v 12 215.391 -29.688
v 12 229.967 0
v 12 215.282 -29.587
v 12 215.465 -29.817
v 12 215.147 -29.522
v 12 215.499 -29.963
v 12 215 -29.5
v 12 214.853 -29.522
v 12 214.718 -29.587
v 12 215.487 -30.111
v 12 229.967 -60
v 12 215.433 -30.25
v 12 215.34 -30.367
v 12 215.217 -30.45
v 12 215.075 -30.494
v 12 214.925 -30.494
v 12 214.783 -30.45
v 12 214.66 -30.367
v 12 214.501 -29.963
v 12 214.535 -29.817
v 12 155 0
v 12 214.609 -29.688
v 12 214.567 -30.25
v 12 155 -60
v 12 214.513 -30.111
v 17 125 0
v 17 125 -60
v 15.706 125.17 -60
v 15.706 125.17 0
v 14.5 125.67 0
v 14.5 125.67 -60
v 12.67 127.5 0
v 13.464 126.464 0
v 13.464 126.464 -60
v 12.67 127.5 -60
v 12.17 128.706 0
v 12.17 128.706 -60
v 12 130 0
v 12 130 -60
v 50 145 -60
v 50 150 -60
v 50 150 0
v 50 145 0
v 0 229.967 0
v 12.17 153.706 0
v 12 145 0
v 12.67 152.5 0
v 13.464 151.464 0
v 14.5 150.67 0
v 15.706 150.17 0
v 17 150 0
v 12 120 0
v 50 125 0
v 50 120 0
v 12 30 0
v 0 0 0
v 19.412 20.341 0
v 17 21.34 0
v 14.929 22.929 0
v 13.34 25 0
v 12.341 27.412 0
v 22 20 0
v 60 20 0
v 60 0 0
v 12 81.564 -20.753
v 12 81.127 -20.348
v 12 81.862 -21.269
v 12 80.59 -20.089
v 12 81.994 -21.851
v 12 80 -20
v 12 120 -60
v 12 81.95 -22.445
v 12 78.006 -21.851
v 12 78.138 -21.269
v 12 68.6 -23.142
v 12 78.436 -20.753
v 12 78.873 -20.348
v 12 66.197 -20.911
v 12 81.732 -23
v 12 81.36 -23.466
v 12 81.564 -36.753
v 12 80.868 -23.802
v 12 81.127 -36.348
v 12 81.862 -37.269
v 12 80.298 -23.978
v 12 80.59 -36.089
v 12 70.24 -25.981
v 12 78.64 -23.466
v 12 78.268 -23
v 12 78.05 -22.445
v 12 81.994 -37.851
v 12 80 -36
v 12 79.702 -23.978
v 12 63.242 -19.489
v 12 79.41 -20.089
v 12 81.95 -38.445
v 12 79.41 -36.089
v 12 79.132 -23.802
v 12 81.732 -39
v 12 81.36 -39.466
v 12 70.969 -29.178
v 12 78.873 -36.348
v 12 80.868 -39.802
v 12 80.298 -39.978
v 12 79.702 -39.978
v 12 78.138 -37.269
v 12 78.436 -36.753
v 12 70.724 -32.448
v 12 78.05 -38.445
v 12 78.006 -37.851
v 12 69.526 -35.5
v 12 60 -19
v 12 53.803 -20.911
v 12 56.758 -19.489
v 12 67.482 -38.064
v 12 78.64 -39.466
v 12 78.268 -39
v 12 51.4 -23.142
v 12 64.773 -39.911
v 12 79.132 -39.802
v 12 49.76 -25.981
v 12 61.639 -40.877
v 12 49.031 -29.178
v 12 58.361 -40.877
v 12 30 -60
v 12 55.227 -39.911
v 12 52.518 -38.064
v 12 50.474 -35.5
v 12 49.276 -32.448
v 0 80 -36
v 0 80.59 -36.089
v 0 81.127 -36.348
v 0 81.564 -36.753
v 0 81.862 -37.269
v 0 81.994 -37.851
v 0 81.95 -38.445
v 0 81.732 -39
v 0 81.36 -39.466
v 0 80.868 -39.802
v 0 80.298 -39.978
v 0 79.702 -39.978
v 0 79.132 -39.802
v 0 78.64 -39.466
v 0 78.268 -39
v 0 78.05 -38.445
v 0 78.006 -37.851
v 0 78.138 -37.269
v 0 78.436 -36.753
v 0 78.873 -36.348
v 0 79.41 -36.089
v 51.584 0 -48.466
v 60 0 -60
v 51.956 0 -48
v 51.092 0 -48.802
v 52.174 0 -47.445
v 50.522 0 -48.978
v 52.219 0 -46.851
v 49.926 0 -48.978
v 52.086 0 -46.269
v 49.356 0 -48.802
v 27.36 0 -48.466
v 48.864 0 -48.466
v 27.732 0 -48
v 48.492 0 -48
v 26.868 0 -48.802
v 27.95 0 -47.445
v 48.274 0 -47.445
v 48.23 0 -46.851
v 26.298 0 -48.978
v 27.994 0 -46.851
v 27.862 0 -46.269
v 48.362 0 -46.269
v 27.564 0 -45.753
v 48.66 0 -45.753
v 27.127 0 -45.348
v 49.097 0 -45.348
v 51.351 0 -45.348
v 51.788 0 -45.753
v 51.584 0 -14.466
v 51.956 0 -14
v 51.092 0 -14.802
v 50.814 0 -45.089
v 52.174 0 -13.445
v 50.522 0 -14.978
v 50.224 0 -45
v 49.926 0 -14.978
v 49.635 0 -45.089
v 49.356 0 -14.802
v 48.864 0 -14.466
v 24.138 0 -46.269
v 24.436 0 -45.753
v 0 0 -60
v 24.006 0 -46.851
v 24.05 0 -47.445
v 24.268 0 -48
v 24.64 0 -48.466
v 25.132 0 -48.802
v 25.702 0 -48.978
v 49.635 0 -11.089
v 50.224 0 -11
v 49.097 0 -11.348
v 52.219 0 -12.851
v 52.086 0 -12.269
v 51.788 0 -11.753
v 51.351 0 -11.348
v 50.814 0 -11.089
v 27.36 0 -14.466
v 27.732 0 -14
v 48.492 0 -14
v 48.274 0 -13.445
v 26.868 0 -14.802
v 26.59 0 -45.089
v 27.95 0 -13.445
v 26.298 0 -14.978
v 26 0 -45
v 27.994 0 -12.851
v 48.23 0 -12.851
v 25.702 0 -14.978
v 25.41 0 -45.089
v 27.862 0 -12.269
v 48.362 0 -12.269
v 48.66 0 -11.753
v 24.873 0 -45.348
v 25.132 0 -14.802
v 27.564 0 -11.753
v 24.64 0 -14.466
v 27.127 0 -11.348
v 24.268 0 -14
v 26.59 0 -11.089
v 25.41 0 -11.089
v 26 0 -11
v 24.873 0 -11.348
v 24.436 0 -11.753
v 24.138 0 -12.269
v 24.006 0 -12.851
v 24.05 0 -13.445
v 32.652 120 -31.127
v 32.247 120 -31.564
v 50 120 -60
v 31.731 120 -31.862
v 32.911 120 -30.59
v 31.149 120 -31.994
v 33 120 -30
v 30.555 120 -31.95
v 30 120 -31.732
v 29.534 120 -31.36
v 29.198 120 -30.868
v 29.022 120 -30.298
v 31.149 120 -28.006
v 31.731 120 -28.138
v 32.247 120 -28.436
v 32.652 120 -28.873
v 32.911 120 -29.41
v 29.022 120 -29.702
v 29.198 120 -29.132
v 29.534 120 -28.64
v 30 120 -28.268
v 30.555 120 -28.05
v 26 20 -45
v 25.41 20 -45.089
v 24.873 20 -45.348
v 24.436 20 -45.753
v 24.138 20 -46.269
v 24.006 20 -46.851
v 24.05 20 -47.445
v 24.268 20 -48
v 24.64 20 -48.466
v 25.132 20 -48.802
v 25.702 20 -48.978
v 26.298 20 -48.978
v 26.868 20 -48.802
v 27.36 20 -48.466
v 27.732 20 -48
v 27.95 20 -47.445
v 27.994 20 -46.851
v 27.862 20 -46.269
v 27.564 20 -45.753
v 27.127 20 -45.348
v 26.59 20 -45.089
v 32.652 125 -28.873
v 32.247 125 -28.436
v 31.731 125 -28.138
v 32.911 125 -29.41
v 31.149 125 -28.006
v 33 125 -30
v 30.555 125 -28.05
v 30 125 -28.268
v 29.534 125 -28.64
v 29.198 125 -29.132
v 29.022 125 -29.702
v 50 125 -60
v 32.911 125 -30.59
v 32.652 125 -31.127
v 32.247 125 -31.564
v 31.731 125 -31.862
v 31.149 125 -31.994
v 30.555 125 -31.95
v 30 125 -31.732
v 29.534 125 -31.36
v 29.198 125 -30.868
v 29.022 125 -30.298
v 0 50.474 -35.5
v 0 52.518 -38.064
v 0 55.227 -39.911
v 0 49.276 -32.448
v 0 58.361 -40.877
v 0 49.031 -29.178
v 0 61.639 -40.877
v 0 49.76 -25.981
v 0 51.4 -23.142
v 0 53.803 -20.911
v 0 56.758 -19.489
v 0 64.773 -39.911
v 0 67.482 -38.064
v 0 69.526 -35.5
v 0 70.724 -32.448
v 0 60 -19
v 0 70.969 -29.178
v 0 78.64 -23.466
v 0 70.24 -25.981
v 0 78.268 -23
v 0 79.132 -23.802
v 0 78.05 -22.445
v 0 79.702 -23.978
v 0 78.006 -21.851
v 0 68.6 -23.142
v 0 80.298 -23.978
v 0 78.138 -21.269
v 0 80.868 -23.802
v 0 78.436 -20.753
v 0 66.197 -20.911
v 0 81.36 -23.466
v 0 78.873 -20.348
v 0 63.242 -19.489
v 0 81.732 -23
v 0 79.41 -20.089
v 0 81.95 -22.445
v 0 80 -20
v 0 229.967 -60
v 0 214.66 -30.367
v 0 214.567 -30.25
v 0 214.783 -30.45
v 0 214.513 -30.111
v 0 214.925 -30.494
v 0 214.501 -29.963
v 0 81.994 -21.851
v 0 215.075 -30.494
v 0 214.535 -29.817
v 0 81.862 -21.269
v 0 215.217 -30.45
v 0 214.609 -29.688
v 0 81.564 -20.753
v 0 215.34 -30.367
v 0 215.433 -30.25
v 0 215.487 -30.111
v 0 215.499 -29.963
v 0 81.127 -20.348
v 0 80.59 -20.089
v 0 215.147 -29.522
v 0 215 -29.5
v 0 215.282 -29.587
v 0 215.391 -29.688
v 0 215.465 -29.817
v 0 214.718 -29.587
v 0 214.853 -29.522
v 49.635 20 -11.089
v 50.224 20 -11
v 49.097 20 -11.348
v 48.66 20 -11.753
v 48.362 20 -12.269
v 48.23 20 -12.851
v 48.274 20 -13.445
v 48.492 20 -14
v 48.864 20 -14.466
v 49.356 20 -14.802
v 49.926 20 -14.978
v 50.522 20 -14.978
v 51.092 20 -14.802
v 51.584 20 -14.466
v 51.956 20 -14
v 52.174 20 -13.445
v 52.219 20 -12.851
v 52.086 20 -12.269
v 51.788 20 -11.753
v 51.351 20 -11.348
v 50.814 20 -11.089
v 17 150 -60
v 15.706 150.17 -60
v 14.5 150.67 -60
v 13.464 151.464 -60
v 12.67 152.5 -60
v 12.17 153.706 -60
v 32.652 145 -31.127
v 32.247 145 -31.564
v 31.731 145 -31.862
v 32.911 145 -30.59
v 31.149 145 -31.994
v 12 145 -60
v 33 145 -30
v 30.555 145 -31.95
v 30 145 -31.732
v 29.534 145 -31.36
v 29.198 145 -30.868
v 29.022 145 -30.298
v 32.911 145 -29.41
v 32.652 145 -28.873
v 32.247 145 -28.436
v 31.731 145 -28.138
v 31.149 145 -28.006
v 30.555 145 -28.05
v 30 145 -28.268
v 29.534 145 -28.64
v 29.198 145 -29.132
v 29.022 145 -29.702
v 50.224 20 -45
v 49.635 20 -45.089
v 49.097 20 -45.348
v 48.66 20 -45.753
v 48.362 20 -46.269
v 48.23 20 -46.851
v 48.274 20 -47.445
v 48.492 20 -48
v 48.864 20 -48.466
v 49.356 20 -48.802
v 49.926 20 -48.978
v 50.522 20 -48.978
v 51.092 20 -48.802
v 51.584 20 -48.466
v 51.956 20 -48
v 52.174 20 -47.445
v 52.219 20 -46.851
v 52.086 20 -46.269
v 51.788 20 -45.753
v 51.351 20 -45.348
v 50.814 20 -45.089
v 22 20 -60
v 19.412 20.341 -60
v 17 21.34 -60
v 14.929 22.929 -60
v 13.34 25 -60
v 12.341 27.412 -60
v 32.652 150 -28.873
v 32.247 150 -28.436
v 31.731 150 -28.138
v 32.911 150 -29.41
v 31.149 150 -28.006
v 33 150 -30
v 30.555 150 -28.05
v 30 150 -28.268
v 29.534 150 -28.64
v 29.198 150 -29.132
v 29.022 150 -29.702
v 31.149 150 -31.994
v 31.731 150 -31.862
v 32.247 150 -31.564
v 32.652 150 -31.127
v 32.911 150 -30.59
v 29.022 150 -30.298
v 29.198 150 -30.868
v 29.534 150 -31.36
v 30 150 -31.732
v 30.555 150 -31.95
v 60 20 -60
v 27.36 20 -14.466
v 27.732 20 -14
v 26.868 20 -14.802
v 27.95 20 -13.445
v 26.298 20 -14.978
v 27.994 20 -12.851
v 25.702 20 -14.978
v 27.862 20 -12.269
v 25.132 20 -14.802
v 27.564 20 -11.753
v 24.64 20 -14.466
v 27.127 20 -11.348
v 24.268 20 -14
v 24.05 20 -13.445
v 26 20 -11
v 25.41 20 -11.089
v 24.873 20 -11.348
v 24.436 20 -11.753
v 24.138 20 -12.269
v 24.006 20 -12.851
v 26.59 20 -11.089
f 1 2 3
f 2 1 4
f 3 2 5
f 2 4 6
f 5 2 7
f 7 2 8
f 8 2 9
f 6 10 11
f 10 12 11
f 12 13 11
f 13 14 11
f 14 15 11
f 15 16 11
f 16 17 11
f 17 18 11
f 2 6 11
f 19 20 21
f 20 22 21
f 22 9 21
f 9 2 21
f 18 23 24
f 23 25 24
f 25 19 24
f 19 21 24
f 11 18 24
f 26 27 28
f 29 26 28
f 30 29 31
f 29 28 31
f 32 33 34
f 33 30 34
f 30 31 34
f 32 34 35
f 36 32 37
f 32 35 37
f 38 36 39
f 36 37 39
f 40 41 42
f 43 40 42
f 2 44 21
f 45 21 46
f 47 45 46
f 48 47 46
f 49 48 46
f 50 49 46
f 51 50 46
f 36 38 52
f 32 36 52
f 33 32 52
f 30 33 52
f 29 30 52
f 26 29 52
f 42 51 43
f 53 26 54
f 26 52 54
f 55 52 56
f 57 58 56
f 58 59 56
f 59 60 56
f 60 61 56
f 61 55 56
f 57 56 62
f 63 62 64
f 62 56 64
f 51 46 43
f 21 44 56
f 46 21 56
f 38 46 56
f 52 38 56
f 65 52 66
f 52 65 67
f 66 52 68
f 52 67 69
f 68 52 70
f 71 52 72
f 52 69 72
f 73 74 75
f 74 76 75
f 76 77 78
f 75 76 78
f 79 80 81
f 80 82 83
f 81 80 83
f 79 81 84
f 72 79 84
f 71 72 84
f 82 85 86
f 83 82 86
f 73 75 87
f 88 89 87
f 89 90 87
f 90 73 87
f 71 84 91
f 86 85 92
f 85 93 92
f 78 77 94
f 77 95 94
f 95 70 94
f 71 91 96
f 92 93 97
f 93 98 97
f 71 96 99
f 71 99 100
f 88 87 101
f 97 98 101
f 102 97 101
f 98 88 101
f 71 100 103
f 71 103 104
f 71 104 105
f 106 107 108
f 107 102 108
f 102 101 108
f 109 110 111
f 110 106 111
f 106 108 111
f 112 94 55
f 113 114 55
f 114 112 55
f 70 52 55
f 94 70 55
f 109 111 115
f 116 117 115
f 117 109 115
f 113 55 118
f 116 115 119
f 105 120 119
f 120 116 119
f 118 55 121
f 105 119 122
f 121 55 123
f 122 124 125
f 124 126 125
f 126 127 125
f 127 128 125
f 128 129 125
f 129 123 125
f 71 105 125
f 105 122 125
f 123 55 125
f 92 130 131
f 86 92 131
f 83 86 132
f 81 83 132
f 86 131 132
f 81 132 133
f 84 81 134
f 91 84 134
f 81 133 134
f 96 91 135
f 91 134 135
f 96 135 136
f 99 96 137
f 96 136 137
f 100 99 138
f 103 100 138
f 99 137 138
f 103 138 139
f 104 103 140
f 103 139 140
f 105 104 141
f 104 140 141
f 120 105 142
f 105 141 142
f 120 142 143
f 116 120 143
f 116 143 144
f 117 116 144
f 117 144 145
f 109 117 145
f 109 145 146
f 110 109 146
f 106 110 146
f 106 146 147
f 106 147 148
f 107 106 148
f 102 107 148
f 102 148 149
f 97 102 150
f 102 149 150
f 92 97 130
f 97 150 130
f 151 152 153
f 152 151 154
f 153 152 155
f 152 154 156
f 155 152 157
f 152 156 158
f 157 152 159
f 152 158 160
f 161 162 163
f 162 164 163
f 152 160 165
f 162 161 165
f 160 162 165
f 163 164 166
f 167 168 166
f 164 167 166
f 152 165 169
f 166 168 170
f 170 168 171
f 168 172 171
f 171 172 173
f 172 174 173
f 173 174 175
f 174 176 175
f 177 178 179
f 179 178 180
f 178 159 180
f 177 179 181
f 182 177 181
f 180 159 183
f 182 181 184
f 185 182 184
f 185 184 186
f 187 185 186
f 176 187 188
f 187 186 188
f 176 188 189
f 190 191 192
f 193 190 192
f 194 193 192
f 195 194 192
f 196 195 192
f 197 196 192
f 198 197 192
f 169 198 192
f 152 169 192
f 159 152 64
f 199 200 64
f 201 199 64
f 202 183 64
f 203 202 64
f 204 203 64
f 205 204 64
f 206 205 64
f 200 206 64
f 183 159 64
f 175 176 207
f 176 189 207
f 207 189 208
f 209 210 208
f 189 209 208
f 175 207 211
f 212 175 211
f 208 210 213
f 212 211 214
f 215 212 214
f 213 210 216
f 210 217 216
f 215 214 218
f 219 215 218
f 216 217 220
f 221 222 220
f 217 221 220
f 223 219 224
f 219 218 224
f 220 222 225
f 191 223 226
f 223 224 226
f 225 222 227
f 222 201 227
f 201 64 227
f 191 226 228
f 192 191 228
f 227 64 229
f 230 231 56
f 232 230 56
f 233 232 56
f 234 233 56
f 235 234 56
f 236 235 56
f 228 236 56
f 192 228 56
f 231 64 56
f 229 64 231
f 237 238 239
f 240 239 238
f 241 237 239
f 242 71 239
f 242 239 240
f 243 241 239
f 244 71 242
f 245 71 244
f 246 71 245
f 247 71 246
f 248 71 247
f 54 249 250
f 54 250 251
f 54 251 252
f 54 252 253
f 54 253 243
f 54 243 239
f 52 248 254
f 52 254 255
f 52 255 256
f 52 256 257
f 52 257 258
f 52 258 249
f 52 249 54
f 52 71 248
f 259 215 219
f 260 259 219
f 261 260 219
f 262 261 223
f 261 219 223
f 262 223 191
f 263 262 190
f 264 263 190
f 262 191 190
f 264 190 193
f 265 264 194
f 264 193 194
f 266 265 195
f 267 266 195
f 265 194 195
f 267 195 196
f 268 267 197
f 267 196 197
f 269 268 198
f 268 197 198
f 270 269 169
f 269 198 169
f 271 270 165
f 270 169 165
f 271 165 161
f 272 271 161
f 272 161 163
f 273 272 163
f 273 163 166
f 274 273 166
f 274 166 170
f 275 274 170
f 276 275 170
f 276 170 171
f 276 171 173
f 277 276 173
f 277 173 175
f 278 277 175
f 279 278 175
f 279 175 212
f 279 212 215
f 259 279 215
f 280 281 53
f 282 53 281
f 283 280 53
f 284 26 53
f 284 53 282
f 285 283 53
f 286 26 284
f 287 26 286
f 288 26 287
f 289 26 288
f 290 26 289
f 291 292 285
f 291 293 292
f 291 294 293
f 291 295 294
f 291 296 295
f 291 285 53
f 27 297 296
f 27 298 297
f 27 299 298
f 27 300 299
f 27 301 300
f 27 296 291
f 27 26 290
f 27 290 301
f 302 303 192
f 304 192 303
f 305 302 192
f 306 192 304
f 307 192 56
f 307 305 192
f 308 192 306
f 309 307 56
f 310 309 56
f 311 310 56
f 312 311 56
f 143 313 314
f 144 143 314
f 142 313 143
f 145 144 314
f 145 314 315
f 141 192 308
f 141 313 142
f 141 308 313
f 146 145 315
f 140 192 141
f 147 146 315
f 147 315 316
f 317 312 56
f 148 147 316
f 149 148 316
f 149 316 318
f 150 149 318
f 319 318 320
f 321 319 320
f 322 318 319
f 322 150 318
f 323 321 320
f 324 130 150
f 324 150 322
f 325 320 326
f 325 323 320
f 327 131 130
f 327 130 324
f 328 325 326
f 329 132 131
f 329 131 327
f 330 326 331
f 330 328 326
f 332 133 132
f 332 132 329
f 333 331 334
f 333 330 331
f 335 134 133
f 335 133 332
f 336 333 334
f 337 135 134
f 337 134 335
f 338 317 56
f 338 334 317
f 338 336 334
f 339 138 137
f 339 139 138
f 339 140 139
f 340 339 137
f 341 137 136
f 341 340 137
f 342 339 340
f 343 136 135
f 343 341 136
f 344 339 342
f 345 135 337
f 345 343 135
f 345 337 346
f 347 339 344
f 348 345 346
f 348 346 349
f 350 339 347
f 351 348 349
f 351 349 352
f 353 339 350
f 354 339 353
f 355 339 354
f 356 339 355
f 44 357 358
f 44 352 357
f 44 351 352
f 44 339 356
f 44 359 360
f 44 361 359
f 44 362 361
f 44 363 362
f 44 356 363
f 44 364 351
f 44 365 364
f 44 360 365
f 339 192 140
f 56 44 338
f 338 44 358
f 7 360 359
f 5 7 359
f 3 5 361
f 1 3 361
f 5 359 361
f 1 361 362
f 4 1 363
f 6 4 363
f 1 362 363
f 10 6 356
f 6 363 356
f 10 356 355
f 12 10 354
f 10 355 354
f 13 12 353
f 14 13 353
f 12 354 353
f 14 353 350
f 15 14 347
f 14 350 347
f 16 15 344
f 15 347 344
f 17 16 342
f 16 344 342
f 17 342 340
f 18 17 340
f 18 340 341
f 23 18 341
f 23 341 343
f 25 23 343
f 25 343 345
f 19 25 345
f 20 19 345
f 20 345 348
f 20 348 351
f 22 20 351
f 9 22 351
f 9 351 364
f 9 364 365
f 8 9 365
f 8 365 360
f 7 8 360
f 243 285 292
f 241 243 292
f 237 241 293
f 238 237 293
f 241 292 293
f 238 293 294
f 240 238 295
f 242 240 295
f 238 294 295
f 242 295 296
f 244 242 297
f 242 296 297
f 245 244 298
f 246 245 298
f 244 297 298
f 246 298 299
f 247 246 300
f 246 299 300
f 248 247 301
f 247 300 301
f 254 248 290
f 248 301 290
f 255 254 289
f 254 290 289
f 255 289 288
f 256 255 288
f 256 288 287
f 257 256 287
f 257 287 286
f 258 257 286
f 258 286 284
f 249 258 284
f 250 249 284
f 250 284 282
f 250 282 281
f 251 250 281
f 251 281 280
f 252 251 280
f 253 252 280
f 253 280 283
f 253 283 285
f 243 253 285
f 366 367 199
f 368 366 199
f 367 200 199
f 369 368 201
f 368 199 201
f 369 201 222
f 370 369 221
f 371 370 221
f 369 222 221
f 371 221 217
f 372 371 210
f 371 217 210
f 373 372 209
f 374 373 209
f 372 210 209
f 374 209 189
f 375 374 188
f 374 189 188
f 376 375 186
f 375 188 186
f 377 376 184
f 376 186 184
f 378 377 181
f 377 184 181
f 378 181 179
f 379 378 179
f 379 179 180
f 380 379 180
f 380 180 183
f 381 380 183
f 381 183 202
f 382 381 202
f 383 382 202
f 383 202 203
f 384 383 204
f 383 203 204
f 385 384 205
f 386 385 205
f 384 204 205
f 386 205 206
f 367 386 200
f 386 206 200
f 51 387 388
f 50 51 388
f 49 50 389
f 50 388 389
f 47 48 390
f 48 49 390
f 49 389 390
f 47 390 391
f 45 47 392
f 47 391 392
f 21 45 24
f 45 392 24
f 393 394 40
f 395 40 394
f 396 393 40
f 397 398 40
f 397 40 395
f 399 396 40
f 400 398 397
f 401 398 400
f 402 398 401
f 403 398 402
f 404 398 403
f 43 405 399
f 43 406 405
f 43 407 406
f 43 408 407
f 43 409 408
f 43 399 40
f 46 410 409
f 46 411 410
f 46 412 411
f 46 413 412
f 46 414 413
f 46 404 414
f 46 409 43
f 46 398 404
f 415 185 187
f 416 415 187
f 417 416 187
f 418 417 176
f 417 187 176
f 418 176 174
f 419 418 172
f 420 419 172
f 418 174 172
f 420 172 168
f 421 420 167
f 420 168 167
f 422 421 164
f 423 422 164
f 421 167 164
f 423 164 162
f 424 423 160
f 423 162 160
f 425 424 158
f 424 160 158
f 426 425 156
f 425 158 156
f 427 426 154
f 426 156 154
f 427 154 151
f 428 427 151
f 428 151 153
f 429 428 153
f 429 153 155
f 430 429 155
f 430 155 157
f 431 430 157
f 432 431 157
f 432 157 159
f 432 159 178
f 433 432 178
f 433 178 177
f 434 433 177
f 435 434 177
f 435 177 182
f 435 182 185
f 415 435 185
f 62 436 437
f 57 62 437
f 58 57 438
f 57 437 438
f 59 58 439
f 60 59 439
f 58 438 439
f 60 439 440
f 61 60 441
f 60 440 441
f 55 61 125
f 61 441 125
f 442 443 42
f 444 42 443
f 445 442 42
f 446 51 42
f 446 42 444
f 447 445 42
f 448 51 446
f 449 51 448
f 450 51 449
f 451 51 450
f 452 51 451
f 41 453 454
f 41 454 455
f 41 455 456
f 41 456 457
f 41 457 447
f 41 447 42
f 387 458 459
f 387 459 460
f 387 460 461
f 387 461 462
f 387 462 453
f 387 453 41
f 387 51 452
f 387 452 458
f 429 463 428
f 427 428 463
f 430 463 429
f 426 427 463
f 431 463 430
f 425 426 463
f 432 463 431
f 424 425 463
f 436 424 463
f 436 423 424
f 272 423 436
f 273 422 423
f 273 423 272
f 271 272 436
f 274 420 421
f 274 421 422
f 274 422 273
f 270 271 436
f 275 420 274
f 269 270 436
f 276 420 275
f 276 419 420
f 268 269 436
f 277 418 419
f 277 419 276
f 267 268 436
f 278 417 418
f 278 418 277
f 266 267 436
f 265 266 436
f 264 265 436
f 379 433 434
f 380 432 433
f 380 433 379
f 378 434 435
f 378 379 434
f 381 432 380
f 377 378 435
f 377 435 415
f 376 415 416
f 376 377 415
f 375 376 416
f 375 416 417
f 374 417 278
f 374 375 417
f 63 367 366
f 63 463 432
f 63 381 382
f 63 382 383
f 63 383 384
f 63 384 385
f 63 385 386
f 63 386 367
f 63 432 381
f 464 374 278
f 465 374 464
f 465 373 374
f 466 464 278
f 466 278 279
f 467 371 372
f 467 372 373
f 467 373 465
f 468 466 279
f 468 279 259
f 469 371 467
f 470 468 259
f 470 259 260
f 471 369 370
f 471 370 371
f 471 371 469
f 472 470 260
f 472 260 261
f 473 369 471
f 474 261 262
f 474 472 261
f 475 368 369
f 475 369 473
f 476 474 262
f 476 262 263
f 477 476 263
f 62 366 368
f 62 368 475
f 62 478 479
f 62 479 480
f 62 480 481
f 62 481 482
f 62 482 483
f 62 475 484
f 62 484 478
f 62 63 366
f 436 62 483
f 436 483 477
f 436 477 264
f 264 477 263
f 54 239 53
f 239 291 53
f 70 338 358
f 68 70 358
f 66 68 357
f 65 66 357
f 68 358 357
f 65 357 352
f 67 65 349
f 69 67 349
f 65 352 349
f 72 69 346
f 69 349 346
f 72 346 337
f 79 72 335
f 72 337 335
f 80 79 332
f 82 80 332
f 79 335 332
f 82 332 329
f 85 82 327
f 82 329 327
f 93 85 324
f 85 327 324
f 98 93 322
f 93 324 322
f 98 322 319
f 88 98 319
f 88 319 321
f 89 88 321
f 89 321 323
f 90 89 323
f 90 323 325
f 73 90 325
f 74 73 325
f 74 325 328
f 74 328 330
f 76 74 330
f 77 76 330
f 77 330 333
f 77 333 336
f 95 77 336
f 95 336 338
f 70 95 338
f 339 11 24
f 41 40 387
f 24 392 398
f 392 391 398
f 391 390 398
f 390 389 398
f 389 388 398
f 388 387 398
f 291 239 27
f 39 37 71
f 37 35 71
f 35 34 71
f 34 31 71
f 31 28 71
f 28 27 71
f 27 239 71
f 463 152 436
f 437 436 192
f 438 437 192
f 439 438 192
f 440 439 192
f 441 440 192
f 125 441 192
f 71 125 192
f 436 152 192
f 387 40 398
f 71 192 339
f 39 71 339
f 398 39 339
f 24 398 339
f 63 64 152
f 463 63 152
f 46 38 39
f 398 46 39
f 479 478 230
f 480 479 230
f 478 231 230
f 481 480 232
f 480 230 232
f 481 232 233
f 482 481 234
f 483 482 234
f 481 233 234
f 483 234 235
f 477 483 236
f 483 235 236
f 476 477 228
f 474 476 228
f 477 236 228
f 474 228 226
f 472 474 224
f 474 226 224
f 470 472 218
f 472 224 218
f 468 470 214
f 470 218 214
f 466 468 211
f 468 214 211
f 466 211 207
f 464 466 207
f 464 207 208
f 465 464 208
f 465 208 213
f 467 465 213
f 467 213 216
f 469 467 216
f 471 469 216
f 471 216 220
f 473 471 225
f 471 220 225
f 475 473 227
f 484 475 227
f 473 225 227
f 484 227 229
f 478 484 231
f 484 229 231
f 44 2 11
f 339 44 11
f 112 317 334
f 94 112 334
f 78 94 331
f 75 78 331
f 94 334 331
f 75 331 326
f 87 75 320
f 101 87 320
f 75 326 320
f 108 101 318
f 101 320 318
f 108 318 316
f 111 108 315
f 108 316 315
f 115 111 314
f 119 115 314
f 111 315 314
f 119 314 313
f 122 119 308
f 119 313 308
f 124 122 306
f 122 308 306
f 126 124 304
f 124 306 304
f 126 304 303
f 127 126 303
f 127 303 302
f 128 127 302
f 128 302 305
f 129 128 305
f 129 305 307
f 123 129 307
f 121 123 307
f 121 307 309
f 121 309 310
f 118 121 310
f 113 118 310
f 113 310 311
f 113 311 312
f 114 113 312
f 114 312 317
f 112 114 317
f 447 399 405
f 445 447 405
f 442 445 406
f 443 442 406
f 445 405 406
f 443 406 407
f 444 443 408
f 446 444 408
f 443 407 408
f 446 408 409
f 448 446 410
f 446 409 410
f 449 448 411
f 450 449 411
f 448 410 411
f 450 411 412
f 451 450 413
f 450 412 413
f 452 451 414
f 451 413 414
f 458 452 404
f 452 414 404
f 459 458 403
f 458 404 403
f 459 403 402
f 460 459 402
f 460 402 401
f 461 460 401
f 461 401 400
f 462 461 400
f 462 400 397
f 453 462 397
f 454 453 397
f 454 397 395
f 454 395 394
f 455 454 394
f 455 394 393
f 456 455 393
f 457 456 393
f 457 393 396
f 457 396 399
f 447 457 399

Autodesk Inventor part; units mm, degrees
ref_plane "YZ Plane" through (0, 0, 0) normal (1, 0, 0) x (0, 1, 0)
ref_plane "XZ Plane" through (0, 0, 0) normal (0, 1, 0) x (-1, 0, 0)
ref_plane "XY Plane" through (0, 0, 0) normal (0, 0, 1) x (1, 0, 0)
sketch "Эскиз1" plane through (0, 0, 0) normal (0, 1, 0) x (-1, 0, 0)
  line L0 (0, 0) -> (-60, 0)
  line L1 (-60, 0) -> (-60, -60)
  line L2 (-60, -60) -> (0, -60)
  line L3 (0, -60) -> (0, 0)
  dimension "d0" = 60
  dimension "d1" = 60
extrude "Выдавливание1" add sketch "Эскиз1" along normal blind 20
sketch "Эскиз2" plane through (0, 20, 0) normal (0, 1, 0) x (1, 0, 0)
  line L0 (0, 0) -> (60, 0) projected
  line L1 (0, 0) -> (12, 0)
  line L2 (12, 0) -> (12, 60)
  line L3 (60, 60) -> (0, 60) projected
  line L4 (0, 60) -> (0, 0) projected
  line L5 (0, 60) -> (0, 0)
  dimension "d4" = 12
extrude "Выдавливание2" add sketch "Эскиз2" along normal blind 260
sketch "Эскиз3" plane through (0, 20, 0) normal (0, 1, 0) x (1, 0, 0)
  point P0 (0, 0)
  point P1 (26, 13)
  point P2 (26, 47)
  point P3 (50.2241, 13)
  point P4 (50.2241, 47)
hole "Отверстие1" at (26, 20, -13) at (26, 20, -47) at (50.2241, 20, -13) at (50.2241, 20, -47) direction (0, -1, 0) diameter 4 depth 40 tip angle 118
sketch "Эскиз4" plane through (12, 20, 0) normal (1, 0, 0) x (0, 0, -1)
  point P0 (0, -20)
  point P1 (30, 88)
  dimension "d14" = 0
extrude "Выдавливание3" [suppressed]
sketch "Эскиз5" plane through (12, 20, 0) normal (1, 0, 0) x (0, 0, -1)
  point P0 (0, -20)
sketch "Эскиз6" plane through (0, 0, 0) normal (0, 0, 1) x (1, 0, 0)
  line L0 (0, 0) -> (0, 280) projected
  line L1 (12, 20) -> (12, 280) projected
sketch "Эскиз7" plane through (60, 0, -60) normal (0, 0, -1) x (-1, 0, 0)
  point P0 (60, 0)
sketch "Эскиз8" plane through (12, 20, 0) normal (1, 0, 0) x (0, 0, -1)
  circle A0 centre (30, 80) radius 11.5
  point P0 (0, -20)
  point P1 (0, 80)
  dimension "d17" = 23
extrude "Выдавливание4" cut sketch "Эскиз8" against normal blind 100
sketch "Эскиз9" plane through (0, 0, -60) normal (-1, 0, 0) x (0, 0, 1)
  circle A0 centre (29.731, 99.8395) radius 12.5286
  point P0 (60, 0)
  point P1 (0, 80)
extrude "Выдавливание5" add sketch "Эскиз9" against normal blind 12
sketch "Эскиз10" plane through (0, 0, -60) normal (-1, 0, 0) x (0, 0, 1)
  line L0 (0, 0) -> (0, 280) projected
  circle A0 centre (30, 60) radius 11
  circle A1 centre (22, 80) radius 2
  circle A2 centre (38, 80) radius 2
  point P0 (60, 0)
  point P1 (0, 60)
  point P2 (0, 80)
  point P3 (30, 80)
  dimension "d22" = 22
  dimension "d23" = 4
  dimension "d24" = 4
extrude "Выдавливание6" cut sketch "Эскиз10" against normal blind 12
sketch "Эскиз11" plane through (0, 0, 0) normal (0, -1, 0) x (1, 0, 0)
  point P0 (0, 0)
fillet "Сопряжение1" radius 10 1 edges at (12, 20, -30)
sketch "Эскиз12" plane through (0, 0, -60) normal (-1, 0, 0) x (0, 0, 1)
  line L0 (0, 120) -> (60, 120)
  line L1 (60, 120) -> (60, 125)
  line L2 (60, 125) -> (0, 125)
  line L3 (0, 125) -> (0, 120)
  point P0 (60, 0)
  dimension "d28" = 60
  dimension "d29" = 5
extrude "Выдавливание7" add sketch "Эскиз12" against normal blind 50
fillet "Сопряжение2" radius 5 1 edges at (12, 125, -30)
sketch "Эскиз13" plane through (50, 125, 0) normal (0, 1, 0) x (1, 0, 0)
  circle A0 centre (-19, 30) radius 2
  point P0 (-50, 0)
  dimension "d33" = 4
extrude "Выдавливание8" cut sketch "Эскиз13" against normal blind 50
sketch "Эскиз14" plane through (0, 0, -60) normal (-1, 0, 0) x (0, 0, 1)
  line L0 (0, 0) -> (0, 280) projected
  line L1 (0, 145) -> (60, 145)
  line L2 (60, 145) -> (60, 150)
  line L3 (60, 150) -> (0, 150)
  line L4 (0, 150) -> (0, 145)
  point P0 (60, 0)
  dimension "d36" = 60
  dimension "d37" = 5
extrude "Выдавливание9" add sketch "Эскиз14" against normal blind 50
fillet "Сопряжение3" radius 5 1 edges at (12, 150, -30)
sketch "Эскиз15" plane through (12, 145, -60) normal (0, -1, 0) x (1, 0, 0)
  circle A0 centre (19, 30) radius 2 projected
  circle A1 centre (19, 30) radius 2
  circle A2 centre (19, 30) radius 2
  point P0 (-12, 60)
  point P1 (3.4297, 11.4015)
  dimension "d41" = 4
extrude "Выдавливание10" cut sketch "Эскиз15" against normal blind 50
sketch "Эскиз16" plane through (0, 0, -60) normal (-1, 0, 0) x (0, 0, 1)
  line L0 (0, 0) -> (0, 280) projected
  circle A0 centre (30, 215) radius 0.5
  point P0 (60, 0)
  point P1 (0, 215)
  point P2 (0, 215)
  dimension "d44" = 1
extrude "Выдавливание11" cut sketch "Эскиз16" against normal blind 100
sketch "Эскиз17" plane through (12, 280, 0) normal (1, 0, 0) x (0, 0, -1)
  point P0 (0, -280)
sketch "Эскиз18" plane through (12, 280, 0) normal (1, 0, 0) x (0, 0, -1)
  line L0 (0, -125) -> (0, 0) projected
  line L1 (60, -280) -> (60, 0) projected
  line L2 (0, -80) -> (0, -50)
  line L3 (0, -50) -> (5, -50)
  line L4 (5, -50) -> (5, -80)
  line L5 (5, -80) -> (0, -80)
  line L6 (0, -80) -> (0, -50)
  point P0 (0, -280)
  point P1 (30, -80)
  point P2 (30, -50)
  dimension "d47" = 5
extrude "Выдавливание12" add sketch "Эскиз18" along normal blind 44.5
sketch "Эскиз19" plane through (0, 0, 0) normal (0, 0, 1) x (1, 0, 0)
  circle A0 centre (52.5, 223) radius 2
  circle A1 centre (52.5, 207) radius 2
  point P0 (0, 0)
  point P1 (52.5, 215)
  dimension "d50" = 4
  dimension "d51" = 4
extrude "Выдавливание13" cut sketch "Эскиз19" against normal blind 45
fillet "Сопряжение4" radius 10 1 edges at (12, 215, -5)
sketch "Эскиз20" plane through (12, 280, 0) normal (1, 0, 0) x (0, 0, -1)
  line L0 (0, -280) -> (0, 0) projected
  line L1 (0, -50.033) -> (60, -50.033)
  line L2 (60, -280) -> (60, 0) projected
  line L3 (60, -50.033) -> (60, 0)
  line L4 (60, 0) -> (0, 0)
  line L5 (0, 0) -> (0, -50.033)
extrude "Выдавливание14" cut sketch "Эскиз20" against normal blind 100
sketch "Эскиз21" plane through (0, 0, 0) normal (0, 0, 1) x (1, 0, 0)
  line L0 (22, 230) -> (12, 230) projected
  line L1 (22, 200) -> (56.5, 200) projected
  line L2 (12, 230) -> (56.5, 230)
  line L3 (56.5, 230) -> (56.5, 200)
  line L4 (56.5, 200) -> (12, 200)
  line L5 (12, 200) -> (12, 230)
  point P0 (0, 0)
extrude "Выдавливание15" cut sketch "Эскиз21" against normal blind 100
properties part number "Подпора"
